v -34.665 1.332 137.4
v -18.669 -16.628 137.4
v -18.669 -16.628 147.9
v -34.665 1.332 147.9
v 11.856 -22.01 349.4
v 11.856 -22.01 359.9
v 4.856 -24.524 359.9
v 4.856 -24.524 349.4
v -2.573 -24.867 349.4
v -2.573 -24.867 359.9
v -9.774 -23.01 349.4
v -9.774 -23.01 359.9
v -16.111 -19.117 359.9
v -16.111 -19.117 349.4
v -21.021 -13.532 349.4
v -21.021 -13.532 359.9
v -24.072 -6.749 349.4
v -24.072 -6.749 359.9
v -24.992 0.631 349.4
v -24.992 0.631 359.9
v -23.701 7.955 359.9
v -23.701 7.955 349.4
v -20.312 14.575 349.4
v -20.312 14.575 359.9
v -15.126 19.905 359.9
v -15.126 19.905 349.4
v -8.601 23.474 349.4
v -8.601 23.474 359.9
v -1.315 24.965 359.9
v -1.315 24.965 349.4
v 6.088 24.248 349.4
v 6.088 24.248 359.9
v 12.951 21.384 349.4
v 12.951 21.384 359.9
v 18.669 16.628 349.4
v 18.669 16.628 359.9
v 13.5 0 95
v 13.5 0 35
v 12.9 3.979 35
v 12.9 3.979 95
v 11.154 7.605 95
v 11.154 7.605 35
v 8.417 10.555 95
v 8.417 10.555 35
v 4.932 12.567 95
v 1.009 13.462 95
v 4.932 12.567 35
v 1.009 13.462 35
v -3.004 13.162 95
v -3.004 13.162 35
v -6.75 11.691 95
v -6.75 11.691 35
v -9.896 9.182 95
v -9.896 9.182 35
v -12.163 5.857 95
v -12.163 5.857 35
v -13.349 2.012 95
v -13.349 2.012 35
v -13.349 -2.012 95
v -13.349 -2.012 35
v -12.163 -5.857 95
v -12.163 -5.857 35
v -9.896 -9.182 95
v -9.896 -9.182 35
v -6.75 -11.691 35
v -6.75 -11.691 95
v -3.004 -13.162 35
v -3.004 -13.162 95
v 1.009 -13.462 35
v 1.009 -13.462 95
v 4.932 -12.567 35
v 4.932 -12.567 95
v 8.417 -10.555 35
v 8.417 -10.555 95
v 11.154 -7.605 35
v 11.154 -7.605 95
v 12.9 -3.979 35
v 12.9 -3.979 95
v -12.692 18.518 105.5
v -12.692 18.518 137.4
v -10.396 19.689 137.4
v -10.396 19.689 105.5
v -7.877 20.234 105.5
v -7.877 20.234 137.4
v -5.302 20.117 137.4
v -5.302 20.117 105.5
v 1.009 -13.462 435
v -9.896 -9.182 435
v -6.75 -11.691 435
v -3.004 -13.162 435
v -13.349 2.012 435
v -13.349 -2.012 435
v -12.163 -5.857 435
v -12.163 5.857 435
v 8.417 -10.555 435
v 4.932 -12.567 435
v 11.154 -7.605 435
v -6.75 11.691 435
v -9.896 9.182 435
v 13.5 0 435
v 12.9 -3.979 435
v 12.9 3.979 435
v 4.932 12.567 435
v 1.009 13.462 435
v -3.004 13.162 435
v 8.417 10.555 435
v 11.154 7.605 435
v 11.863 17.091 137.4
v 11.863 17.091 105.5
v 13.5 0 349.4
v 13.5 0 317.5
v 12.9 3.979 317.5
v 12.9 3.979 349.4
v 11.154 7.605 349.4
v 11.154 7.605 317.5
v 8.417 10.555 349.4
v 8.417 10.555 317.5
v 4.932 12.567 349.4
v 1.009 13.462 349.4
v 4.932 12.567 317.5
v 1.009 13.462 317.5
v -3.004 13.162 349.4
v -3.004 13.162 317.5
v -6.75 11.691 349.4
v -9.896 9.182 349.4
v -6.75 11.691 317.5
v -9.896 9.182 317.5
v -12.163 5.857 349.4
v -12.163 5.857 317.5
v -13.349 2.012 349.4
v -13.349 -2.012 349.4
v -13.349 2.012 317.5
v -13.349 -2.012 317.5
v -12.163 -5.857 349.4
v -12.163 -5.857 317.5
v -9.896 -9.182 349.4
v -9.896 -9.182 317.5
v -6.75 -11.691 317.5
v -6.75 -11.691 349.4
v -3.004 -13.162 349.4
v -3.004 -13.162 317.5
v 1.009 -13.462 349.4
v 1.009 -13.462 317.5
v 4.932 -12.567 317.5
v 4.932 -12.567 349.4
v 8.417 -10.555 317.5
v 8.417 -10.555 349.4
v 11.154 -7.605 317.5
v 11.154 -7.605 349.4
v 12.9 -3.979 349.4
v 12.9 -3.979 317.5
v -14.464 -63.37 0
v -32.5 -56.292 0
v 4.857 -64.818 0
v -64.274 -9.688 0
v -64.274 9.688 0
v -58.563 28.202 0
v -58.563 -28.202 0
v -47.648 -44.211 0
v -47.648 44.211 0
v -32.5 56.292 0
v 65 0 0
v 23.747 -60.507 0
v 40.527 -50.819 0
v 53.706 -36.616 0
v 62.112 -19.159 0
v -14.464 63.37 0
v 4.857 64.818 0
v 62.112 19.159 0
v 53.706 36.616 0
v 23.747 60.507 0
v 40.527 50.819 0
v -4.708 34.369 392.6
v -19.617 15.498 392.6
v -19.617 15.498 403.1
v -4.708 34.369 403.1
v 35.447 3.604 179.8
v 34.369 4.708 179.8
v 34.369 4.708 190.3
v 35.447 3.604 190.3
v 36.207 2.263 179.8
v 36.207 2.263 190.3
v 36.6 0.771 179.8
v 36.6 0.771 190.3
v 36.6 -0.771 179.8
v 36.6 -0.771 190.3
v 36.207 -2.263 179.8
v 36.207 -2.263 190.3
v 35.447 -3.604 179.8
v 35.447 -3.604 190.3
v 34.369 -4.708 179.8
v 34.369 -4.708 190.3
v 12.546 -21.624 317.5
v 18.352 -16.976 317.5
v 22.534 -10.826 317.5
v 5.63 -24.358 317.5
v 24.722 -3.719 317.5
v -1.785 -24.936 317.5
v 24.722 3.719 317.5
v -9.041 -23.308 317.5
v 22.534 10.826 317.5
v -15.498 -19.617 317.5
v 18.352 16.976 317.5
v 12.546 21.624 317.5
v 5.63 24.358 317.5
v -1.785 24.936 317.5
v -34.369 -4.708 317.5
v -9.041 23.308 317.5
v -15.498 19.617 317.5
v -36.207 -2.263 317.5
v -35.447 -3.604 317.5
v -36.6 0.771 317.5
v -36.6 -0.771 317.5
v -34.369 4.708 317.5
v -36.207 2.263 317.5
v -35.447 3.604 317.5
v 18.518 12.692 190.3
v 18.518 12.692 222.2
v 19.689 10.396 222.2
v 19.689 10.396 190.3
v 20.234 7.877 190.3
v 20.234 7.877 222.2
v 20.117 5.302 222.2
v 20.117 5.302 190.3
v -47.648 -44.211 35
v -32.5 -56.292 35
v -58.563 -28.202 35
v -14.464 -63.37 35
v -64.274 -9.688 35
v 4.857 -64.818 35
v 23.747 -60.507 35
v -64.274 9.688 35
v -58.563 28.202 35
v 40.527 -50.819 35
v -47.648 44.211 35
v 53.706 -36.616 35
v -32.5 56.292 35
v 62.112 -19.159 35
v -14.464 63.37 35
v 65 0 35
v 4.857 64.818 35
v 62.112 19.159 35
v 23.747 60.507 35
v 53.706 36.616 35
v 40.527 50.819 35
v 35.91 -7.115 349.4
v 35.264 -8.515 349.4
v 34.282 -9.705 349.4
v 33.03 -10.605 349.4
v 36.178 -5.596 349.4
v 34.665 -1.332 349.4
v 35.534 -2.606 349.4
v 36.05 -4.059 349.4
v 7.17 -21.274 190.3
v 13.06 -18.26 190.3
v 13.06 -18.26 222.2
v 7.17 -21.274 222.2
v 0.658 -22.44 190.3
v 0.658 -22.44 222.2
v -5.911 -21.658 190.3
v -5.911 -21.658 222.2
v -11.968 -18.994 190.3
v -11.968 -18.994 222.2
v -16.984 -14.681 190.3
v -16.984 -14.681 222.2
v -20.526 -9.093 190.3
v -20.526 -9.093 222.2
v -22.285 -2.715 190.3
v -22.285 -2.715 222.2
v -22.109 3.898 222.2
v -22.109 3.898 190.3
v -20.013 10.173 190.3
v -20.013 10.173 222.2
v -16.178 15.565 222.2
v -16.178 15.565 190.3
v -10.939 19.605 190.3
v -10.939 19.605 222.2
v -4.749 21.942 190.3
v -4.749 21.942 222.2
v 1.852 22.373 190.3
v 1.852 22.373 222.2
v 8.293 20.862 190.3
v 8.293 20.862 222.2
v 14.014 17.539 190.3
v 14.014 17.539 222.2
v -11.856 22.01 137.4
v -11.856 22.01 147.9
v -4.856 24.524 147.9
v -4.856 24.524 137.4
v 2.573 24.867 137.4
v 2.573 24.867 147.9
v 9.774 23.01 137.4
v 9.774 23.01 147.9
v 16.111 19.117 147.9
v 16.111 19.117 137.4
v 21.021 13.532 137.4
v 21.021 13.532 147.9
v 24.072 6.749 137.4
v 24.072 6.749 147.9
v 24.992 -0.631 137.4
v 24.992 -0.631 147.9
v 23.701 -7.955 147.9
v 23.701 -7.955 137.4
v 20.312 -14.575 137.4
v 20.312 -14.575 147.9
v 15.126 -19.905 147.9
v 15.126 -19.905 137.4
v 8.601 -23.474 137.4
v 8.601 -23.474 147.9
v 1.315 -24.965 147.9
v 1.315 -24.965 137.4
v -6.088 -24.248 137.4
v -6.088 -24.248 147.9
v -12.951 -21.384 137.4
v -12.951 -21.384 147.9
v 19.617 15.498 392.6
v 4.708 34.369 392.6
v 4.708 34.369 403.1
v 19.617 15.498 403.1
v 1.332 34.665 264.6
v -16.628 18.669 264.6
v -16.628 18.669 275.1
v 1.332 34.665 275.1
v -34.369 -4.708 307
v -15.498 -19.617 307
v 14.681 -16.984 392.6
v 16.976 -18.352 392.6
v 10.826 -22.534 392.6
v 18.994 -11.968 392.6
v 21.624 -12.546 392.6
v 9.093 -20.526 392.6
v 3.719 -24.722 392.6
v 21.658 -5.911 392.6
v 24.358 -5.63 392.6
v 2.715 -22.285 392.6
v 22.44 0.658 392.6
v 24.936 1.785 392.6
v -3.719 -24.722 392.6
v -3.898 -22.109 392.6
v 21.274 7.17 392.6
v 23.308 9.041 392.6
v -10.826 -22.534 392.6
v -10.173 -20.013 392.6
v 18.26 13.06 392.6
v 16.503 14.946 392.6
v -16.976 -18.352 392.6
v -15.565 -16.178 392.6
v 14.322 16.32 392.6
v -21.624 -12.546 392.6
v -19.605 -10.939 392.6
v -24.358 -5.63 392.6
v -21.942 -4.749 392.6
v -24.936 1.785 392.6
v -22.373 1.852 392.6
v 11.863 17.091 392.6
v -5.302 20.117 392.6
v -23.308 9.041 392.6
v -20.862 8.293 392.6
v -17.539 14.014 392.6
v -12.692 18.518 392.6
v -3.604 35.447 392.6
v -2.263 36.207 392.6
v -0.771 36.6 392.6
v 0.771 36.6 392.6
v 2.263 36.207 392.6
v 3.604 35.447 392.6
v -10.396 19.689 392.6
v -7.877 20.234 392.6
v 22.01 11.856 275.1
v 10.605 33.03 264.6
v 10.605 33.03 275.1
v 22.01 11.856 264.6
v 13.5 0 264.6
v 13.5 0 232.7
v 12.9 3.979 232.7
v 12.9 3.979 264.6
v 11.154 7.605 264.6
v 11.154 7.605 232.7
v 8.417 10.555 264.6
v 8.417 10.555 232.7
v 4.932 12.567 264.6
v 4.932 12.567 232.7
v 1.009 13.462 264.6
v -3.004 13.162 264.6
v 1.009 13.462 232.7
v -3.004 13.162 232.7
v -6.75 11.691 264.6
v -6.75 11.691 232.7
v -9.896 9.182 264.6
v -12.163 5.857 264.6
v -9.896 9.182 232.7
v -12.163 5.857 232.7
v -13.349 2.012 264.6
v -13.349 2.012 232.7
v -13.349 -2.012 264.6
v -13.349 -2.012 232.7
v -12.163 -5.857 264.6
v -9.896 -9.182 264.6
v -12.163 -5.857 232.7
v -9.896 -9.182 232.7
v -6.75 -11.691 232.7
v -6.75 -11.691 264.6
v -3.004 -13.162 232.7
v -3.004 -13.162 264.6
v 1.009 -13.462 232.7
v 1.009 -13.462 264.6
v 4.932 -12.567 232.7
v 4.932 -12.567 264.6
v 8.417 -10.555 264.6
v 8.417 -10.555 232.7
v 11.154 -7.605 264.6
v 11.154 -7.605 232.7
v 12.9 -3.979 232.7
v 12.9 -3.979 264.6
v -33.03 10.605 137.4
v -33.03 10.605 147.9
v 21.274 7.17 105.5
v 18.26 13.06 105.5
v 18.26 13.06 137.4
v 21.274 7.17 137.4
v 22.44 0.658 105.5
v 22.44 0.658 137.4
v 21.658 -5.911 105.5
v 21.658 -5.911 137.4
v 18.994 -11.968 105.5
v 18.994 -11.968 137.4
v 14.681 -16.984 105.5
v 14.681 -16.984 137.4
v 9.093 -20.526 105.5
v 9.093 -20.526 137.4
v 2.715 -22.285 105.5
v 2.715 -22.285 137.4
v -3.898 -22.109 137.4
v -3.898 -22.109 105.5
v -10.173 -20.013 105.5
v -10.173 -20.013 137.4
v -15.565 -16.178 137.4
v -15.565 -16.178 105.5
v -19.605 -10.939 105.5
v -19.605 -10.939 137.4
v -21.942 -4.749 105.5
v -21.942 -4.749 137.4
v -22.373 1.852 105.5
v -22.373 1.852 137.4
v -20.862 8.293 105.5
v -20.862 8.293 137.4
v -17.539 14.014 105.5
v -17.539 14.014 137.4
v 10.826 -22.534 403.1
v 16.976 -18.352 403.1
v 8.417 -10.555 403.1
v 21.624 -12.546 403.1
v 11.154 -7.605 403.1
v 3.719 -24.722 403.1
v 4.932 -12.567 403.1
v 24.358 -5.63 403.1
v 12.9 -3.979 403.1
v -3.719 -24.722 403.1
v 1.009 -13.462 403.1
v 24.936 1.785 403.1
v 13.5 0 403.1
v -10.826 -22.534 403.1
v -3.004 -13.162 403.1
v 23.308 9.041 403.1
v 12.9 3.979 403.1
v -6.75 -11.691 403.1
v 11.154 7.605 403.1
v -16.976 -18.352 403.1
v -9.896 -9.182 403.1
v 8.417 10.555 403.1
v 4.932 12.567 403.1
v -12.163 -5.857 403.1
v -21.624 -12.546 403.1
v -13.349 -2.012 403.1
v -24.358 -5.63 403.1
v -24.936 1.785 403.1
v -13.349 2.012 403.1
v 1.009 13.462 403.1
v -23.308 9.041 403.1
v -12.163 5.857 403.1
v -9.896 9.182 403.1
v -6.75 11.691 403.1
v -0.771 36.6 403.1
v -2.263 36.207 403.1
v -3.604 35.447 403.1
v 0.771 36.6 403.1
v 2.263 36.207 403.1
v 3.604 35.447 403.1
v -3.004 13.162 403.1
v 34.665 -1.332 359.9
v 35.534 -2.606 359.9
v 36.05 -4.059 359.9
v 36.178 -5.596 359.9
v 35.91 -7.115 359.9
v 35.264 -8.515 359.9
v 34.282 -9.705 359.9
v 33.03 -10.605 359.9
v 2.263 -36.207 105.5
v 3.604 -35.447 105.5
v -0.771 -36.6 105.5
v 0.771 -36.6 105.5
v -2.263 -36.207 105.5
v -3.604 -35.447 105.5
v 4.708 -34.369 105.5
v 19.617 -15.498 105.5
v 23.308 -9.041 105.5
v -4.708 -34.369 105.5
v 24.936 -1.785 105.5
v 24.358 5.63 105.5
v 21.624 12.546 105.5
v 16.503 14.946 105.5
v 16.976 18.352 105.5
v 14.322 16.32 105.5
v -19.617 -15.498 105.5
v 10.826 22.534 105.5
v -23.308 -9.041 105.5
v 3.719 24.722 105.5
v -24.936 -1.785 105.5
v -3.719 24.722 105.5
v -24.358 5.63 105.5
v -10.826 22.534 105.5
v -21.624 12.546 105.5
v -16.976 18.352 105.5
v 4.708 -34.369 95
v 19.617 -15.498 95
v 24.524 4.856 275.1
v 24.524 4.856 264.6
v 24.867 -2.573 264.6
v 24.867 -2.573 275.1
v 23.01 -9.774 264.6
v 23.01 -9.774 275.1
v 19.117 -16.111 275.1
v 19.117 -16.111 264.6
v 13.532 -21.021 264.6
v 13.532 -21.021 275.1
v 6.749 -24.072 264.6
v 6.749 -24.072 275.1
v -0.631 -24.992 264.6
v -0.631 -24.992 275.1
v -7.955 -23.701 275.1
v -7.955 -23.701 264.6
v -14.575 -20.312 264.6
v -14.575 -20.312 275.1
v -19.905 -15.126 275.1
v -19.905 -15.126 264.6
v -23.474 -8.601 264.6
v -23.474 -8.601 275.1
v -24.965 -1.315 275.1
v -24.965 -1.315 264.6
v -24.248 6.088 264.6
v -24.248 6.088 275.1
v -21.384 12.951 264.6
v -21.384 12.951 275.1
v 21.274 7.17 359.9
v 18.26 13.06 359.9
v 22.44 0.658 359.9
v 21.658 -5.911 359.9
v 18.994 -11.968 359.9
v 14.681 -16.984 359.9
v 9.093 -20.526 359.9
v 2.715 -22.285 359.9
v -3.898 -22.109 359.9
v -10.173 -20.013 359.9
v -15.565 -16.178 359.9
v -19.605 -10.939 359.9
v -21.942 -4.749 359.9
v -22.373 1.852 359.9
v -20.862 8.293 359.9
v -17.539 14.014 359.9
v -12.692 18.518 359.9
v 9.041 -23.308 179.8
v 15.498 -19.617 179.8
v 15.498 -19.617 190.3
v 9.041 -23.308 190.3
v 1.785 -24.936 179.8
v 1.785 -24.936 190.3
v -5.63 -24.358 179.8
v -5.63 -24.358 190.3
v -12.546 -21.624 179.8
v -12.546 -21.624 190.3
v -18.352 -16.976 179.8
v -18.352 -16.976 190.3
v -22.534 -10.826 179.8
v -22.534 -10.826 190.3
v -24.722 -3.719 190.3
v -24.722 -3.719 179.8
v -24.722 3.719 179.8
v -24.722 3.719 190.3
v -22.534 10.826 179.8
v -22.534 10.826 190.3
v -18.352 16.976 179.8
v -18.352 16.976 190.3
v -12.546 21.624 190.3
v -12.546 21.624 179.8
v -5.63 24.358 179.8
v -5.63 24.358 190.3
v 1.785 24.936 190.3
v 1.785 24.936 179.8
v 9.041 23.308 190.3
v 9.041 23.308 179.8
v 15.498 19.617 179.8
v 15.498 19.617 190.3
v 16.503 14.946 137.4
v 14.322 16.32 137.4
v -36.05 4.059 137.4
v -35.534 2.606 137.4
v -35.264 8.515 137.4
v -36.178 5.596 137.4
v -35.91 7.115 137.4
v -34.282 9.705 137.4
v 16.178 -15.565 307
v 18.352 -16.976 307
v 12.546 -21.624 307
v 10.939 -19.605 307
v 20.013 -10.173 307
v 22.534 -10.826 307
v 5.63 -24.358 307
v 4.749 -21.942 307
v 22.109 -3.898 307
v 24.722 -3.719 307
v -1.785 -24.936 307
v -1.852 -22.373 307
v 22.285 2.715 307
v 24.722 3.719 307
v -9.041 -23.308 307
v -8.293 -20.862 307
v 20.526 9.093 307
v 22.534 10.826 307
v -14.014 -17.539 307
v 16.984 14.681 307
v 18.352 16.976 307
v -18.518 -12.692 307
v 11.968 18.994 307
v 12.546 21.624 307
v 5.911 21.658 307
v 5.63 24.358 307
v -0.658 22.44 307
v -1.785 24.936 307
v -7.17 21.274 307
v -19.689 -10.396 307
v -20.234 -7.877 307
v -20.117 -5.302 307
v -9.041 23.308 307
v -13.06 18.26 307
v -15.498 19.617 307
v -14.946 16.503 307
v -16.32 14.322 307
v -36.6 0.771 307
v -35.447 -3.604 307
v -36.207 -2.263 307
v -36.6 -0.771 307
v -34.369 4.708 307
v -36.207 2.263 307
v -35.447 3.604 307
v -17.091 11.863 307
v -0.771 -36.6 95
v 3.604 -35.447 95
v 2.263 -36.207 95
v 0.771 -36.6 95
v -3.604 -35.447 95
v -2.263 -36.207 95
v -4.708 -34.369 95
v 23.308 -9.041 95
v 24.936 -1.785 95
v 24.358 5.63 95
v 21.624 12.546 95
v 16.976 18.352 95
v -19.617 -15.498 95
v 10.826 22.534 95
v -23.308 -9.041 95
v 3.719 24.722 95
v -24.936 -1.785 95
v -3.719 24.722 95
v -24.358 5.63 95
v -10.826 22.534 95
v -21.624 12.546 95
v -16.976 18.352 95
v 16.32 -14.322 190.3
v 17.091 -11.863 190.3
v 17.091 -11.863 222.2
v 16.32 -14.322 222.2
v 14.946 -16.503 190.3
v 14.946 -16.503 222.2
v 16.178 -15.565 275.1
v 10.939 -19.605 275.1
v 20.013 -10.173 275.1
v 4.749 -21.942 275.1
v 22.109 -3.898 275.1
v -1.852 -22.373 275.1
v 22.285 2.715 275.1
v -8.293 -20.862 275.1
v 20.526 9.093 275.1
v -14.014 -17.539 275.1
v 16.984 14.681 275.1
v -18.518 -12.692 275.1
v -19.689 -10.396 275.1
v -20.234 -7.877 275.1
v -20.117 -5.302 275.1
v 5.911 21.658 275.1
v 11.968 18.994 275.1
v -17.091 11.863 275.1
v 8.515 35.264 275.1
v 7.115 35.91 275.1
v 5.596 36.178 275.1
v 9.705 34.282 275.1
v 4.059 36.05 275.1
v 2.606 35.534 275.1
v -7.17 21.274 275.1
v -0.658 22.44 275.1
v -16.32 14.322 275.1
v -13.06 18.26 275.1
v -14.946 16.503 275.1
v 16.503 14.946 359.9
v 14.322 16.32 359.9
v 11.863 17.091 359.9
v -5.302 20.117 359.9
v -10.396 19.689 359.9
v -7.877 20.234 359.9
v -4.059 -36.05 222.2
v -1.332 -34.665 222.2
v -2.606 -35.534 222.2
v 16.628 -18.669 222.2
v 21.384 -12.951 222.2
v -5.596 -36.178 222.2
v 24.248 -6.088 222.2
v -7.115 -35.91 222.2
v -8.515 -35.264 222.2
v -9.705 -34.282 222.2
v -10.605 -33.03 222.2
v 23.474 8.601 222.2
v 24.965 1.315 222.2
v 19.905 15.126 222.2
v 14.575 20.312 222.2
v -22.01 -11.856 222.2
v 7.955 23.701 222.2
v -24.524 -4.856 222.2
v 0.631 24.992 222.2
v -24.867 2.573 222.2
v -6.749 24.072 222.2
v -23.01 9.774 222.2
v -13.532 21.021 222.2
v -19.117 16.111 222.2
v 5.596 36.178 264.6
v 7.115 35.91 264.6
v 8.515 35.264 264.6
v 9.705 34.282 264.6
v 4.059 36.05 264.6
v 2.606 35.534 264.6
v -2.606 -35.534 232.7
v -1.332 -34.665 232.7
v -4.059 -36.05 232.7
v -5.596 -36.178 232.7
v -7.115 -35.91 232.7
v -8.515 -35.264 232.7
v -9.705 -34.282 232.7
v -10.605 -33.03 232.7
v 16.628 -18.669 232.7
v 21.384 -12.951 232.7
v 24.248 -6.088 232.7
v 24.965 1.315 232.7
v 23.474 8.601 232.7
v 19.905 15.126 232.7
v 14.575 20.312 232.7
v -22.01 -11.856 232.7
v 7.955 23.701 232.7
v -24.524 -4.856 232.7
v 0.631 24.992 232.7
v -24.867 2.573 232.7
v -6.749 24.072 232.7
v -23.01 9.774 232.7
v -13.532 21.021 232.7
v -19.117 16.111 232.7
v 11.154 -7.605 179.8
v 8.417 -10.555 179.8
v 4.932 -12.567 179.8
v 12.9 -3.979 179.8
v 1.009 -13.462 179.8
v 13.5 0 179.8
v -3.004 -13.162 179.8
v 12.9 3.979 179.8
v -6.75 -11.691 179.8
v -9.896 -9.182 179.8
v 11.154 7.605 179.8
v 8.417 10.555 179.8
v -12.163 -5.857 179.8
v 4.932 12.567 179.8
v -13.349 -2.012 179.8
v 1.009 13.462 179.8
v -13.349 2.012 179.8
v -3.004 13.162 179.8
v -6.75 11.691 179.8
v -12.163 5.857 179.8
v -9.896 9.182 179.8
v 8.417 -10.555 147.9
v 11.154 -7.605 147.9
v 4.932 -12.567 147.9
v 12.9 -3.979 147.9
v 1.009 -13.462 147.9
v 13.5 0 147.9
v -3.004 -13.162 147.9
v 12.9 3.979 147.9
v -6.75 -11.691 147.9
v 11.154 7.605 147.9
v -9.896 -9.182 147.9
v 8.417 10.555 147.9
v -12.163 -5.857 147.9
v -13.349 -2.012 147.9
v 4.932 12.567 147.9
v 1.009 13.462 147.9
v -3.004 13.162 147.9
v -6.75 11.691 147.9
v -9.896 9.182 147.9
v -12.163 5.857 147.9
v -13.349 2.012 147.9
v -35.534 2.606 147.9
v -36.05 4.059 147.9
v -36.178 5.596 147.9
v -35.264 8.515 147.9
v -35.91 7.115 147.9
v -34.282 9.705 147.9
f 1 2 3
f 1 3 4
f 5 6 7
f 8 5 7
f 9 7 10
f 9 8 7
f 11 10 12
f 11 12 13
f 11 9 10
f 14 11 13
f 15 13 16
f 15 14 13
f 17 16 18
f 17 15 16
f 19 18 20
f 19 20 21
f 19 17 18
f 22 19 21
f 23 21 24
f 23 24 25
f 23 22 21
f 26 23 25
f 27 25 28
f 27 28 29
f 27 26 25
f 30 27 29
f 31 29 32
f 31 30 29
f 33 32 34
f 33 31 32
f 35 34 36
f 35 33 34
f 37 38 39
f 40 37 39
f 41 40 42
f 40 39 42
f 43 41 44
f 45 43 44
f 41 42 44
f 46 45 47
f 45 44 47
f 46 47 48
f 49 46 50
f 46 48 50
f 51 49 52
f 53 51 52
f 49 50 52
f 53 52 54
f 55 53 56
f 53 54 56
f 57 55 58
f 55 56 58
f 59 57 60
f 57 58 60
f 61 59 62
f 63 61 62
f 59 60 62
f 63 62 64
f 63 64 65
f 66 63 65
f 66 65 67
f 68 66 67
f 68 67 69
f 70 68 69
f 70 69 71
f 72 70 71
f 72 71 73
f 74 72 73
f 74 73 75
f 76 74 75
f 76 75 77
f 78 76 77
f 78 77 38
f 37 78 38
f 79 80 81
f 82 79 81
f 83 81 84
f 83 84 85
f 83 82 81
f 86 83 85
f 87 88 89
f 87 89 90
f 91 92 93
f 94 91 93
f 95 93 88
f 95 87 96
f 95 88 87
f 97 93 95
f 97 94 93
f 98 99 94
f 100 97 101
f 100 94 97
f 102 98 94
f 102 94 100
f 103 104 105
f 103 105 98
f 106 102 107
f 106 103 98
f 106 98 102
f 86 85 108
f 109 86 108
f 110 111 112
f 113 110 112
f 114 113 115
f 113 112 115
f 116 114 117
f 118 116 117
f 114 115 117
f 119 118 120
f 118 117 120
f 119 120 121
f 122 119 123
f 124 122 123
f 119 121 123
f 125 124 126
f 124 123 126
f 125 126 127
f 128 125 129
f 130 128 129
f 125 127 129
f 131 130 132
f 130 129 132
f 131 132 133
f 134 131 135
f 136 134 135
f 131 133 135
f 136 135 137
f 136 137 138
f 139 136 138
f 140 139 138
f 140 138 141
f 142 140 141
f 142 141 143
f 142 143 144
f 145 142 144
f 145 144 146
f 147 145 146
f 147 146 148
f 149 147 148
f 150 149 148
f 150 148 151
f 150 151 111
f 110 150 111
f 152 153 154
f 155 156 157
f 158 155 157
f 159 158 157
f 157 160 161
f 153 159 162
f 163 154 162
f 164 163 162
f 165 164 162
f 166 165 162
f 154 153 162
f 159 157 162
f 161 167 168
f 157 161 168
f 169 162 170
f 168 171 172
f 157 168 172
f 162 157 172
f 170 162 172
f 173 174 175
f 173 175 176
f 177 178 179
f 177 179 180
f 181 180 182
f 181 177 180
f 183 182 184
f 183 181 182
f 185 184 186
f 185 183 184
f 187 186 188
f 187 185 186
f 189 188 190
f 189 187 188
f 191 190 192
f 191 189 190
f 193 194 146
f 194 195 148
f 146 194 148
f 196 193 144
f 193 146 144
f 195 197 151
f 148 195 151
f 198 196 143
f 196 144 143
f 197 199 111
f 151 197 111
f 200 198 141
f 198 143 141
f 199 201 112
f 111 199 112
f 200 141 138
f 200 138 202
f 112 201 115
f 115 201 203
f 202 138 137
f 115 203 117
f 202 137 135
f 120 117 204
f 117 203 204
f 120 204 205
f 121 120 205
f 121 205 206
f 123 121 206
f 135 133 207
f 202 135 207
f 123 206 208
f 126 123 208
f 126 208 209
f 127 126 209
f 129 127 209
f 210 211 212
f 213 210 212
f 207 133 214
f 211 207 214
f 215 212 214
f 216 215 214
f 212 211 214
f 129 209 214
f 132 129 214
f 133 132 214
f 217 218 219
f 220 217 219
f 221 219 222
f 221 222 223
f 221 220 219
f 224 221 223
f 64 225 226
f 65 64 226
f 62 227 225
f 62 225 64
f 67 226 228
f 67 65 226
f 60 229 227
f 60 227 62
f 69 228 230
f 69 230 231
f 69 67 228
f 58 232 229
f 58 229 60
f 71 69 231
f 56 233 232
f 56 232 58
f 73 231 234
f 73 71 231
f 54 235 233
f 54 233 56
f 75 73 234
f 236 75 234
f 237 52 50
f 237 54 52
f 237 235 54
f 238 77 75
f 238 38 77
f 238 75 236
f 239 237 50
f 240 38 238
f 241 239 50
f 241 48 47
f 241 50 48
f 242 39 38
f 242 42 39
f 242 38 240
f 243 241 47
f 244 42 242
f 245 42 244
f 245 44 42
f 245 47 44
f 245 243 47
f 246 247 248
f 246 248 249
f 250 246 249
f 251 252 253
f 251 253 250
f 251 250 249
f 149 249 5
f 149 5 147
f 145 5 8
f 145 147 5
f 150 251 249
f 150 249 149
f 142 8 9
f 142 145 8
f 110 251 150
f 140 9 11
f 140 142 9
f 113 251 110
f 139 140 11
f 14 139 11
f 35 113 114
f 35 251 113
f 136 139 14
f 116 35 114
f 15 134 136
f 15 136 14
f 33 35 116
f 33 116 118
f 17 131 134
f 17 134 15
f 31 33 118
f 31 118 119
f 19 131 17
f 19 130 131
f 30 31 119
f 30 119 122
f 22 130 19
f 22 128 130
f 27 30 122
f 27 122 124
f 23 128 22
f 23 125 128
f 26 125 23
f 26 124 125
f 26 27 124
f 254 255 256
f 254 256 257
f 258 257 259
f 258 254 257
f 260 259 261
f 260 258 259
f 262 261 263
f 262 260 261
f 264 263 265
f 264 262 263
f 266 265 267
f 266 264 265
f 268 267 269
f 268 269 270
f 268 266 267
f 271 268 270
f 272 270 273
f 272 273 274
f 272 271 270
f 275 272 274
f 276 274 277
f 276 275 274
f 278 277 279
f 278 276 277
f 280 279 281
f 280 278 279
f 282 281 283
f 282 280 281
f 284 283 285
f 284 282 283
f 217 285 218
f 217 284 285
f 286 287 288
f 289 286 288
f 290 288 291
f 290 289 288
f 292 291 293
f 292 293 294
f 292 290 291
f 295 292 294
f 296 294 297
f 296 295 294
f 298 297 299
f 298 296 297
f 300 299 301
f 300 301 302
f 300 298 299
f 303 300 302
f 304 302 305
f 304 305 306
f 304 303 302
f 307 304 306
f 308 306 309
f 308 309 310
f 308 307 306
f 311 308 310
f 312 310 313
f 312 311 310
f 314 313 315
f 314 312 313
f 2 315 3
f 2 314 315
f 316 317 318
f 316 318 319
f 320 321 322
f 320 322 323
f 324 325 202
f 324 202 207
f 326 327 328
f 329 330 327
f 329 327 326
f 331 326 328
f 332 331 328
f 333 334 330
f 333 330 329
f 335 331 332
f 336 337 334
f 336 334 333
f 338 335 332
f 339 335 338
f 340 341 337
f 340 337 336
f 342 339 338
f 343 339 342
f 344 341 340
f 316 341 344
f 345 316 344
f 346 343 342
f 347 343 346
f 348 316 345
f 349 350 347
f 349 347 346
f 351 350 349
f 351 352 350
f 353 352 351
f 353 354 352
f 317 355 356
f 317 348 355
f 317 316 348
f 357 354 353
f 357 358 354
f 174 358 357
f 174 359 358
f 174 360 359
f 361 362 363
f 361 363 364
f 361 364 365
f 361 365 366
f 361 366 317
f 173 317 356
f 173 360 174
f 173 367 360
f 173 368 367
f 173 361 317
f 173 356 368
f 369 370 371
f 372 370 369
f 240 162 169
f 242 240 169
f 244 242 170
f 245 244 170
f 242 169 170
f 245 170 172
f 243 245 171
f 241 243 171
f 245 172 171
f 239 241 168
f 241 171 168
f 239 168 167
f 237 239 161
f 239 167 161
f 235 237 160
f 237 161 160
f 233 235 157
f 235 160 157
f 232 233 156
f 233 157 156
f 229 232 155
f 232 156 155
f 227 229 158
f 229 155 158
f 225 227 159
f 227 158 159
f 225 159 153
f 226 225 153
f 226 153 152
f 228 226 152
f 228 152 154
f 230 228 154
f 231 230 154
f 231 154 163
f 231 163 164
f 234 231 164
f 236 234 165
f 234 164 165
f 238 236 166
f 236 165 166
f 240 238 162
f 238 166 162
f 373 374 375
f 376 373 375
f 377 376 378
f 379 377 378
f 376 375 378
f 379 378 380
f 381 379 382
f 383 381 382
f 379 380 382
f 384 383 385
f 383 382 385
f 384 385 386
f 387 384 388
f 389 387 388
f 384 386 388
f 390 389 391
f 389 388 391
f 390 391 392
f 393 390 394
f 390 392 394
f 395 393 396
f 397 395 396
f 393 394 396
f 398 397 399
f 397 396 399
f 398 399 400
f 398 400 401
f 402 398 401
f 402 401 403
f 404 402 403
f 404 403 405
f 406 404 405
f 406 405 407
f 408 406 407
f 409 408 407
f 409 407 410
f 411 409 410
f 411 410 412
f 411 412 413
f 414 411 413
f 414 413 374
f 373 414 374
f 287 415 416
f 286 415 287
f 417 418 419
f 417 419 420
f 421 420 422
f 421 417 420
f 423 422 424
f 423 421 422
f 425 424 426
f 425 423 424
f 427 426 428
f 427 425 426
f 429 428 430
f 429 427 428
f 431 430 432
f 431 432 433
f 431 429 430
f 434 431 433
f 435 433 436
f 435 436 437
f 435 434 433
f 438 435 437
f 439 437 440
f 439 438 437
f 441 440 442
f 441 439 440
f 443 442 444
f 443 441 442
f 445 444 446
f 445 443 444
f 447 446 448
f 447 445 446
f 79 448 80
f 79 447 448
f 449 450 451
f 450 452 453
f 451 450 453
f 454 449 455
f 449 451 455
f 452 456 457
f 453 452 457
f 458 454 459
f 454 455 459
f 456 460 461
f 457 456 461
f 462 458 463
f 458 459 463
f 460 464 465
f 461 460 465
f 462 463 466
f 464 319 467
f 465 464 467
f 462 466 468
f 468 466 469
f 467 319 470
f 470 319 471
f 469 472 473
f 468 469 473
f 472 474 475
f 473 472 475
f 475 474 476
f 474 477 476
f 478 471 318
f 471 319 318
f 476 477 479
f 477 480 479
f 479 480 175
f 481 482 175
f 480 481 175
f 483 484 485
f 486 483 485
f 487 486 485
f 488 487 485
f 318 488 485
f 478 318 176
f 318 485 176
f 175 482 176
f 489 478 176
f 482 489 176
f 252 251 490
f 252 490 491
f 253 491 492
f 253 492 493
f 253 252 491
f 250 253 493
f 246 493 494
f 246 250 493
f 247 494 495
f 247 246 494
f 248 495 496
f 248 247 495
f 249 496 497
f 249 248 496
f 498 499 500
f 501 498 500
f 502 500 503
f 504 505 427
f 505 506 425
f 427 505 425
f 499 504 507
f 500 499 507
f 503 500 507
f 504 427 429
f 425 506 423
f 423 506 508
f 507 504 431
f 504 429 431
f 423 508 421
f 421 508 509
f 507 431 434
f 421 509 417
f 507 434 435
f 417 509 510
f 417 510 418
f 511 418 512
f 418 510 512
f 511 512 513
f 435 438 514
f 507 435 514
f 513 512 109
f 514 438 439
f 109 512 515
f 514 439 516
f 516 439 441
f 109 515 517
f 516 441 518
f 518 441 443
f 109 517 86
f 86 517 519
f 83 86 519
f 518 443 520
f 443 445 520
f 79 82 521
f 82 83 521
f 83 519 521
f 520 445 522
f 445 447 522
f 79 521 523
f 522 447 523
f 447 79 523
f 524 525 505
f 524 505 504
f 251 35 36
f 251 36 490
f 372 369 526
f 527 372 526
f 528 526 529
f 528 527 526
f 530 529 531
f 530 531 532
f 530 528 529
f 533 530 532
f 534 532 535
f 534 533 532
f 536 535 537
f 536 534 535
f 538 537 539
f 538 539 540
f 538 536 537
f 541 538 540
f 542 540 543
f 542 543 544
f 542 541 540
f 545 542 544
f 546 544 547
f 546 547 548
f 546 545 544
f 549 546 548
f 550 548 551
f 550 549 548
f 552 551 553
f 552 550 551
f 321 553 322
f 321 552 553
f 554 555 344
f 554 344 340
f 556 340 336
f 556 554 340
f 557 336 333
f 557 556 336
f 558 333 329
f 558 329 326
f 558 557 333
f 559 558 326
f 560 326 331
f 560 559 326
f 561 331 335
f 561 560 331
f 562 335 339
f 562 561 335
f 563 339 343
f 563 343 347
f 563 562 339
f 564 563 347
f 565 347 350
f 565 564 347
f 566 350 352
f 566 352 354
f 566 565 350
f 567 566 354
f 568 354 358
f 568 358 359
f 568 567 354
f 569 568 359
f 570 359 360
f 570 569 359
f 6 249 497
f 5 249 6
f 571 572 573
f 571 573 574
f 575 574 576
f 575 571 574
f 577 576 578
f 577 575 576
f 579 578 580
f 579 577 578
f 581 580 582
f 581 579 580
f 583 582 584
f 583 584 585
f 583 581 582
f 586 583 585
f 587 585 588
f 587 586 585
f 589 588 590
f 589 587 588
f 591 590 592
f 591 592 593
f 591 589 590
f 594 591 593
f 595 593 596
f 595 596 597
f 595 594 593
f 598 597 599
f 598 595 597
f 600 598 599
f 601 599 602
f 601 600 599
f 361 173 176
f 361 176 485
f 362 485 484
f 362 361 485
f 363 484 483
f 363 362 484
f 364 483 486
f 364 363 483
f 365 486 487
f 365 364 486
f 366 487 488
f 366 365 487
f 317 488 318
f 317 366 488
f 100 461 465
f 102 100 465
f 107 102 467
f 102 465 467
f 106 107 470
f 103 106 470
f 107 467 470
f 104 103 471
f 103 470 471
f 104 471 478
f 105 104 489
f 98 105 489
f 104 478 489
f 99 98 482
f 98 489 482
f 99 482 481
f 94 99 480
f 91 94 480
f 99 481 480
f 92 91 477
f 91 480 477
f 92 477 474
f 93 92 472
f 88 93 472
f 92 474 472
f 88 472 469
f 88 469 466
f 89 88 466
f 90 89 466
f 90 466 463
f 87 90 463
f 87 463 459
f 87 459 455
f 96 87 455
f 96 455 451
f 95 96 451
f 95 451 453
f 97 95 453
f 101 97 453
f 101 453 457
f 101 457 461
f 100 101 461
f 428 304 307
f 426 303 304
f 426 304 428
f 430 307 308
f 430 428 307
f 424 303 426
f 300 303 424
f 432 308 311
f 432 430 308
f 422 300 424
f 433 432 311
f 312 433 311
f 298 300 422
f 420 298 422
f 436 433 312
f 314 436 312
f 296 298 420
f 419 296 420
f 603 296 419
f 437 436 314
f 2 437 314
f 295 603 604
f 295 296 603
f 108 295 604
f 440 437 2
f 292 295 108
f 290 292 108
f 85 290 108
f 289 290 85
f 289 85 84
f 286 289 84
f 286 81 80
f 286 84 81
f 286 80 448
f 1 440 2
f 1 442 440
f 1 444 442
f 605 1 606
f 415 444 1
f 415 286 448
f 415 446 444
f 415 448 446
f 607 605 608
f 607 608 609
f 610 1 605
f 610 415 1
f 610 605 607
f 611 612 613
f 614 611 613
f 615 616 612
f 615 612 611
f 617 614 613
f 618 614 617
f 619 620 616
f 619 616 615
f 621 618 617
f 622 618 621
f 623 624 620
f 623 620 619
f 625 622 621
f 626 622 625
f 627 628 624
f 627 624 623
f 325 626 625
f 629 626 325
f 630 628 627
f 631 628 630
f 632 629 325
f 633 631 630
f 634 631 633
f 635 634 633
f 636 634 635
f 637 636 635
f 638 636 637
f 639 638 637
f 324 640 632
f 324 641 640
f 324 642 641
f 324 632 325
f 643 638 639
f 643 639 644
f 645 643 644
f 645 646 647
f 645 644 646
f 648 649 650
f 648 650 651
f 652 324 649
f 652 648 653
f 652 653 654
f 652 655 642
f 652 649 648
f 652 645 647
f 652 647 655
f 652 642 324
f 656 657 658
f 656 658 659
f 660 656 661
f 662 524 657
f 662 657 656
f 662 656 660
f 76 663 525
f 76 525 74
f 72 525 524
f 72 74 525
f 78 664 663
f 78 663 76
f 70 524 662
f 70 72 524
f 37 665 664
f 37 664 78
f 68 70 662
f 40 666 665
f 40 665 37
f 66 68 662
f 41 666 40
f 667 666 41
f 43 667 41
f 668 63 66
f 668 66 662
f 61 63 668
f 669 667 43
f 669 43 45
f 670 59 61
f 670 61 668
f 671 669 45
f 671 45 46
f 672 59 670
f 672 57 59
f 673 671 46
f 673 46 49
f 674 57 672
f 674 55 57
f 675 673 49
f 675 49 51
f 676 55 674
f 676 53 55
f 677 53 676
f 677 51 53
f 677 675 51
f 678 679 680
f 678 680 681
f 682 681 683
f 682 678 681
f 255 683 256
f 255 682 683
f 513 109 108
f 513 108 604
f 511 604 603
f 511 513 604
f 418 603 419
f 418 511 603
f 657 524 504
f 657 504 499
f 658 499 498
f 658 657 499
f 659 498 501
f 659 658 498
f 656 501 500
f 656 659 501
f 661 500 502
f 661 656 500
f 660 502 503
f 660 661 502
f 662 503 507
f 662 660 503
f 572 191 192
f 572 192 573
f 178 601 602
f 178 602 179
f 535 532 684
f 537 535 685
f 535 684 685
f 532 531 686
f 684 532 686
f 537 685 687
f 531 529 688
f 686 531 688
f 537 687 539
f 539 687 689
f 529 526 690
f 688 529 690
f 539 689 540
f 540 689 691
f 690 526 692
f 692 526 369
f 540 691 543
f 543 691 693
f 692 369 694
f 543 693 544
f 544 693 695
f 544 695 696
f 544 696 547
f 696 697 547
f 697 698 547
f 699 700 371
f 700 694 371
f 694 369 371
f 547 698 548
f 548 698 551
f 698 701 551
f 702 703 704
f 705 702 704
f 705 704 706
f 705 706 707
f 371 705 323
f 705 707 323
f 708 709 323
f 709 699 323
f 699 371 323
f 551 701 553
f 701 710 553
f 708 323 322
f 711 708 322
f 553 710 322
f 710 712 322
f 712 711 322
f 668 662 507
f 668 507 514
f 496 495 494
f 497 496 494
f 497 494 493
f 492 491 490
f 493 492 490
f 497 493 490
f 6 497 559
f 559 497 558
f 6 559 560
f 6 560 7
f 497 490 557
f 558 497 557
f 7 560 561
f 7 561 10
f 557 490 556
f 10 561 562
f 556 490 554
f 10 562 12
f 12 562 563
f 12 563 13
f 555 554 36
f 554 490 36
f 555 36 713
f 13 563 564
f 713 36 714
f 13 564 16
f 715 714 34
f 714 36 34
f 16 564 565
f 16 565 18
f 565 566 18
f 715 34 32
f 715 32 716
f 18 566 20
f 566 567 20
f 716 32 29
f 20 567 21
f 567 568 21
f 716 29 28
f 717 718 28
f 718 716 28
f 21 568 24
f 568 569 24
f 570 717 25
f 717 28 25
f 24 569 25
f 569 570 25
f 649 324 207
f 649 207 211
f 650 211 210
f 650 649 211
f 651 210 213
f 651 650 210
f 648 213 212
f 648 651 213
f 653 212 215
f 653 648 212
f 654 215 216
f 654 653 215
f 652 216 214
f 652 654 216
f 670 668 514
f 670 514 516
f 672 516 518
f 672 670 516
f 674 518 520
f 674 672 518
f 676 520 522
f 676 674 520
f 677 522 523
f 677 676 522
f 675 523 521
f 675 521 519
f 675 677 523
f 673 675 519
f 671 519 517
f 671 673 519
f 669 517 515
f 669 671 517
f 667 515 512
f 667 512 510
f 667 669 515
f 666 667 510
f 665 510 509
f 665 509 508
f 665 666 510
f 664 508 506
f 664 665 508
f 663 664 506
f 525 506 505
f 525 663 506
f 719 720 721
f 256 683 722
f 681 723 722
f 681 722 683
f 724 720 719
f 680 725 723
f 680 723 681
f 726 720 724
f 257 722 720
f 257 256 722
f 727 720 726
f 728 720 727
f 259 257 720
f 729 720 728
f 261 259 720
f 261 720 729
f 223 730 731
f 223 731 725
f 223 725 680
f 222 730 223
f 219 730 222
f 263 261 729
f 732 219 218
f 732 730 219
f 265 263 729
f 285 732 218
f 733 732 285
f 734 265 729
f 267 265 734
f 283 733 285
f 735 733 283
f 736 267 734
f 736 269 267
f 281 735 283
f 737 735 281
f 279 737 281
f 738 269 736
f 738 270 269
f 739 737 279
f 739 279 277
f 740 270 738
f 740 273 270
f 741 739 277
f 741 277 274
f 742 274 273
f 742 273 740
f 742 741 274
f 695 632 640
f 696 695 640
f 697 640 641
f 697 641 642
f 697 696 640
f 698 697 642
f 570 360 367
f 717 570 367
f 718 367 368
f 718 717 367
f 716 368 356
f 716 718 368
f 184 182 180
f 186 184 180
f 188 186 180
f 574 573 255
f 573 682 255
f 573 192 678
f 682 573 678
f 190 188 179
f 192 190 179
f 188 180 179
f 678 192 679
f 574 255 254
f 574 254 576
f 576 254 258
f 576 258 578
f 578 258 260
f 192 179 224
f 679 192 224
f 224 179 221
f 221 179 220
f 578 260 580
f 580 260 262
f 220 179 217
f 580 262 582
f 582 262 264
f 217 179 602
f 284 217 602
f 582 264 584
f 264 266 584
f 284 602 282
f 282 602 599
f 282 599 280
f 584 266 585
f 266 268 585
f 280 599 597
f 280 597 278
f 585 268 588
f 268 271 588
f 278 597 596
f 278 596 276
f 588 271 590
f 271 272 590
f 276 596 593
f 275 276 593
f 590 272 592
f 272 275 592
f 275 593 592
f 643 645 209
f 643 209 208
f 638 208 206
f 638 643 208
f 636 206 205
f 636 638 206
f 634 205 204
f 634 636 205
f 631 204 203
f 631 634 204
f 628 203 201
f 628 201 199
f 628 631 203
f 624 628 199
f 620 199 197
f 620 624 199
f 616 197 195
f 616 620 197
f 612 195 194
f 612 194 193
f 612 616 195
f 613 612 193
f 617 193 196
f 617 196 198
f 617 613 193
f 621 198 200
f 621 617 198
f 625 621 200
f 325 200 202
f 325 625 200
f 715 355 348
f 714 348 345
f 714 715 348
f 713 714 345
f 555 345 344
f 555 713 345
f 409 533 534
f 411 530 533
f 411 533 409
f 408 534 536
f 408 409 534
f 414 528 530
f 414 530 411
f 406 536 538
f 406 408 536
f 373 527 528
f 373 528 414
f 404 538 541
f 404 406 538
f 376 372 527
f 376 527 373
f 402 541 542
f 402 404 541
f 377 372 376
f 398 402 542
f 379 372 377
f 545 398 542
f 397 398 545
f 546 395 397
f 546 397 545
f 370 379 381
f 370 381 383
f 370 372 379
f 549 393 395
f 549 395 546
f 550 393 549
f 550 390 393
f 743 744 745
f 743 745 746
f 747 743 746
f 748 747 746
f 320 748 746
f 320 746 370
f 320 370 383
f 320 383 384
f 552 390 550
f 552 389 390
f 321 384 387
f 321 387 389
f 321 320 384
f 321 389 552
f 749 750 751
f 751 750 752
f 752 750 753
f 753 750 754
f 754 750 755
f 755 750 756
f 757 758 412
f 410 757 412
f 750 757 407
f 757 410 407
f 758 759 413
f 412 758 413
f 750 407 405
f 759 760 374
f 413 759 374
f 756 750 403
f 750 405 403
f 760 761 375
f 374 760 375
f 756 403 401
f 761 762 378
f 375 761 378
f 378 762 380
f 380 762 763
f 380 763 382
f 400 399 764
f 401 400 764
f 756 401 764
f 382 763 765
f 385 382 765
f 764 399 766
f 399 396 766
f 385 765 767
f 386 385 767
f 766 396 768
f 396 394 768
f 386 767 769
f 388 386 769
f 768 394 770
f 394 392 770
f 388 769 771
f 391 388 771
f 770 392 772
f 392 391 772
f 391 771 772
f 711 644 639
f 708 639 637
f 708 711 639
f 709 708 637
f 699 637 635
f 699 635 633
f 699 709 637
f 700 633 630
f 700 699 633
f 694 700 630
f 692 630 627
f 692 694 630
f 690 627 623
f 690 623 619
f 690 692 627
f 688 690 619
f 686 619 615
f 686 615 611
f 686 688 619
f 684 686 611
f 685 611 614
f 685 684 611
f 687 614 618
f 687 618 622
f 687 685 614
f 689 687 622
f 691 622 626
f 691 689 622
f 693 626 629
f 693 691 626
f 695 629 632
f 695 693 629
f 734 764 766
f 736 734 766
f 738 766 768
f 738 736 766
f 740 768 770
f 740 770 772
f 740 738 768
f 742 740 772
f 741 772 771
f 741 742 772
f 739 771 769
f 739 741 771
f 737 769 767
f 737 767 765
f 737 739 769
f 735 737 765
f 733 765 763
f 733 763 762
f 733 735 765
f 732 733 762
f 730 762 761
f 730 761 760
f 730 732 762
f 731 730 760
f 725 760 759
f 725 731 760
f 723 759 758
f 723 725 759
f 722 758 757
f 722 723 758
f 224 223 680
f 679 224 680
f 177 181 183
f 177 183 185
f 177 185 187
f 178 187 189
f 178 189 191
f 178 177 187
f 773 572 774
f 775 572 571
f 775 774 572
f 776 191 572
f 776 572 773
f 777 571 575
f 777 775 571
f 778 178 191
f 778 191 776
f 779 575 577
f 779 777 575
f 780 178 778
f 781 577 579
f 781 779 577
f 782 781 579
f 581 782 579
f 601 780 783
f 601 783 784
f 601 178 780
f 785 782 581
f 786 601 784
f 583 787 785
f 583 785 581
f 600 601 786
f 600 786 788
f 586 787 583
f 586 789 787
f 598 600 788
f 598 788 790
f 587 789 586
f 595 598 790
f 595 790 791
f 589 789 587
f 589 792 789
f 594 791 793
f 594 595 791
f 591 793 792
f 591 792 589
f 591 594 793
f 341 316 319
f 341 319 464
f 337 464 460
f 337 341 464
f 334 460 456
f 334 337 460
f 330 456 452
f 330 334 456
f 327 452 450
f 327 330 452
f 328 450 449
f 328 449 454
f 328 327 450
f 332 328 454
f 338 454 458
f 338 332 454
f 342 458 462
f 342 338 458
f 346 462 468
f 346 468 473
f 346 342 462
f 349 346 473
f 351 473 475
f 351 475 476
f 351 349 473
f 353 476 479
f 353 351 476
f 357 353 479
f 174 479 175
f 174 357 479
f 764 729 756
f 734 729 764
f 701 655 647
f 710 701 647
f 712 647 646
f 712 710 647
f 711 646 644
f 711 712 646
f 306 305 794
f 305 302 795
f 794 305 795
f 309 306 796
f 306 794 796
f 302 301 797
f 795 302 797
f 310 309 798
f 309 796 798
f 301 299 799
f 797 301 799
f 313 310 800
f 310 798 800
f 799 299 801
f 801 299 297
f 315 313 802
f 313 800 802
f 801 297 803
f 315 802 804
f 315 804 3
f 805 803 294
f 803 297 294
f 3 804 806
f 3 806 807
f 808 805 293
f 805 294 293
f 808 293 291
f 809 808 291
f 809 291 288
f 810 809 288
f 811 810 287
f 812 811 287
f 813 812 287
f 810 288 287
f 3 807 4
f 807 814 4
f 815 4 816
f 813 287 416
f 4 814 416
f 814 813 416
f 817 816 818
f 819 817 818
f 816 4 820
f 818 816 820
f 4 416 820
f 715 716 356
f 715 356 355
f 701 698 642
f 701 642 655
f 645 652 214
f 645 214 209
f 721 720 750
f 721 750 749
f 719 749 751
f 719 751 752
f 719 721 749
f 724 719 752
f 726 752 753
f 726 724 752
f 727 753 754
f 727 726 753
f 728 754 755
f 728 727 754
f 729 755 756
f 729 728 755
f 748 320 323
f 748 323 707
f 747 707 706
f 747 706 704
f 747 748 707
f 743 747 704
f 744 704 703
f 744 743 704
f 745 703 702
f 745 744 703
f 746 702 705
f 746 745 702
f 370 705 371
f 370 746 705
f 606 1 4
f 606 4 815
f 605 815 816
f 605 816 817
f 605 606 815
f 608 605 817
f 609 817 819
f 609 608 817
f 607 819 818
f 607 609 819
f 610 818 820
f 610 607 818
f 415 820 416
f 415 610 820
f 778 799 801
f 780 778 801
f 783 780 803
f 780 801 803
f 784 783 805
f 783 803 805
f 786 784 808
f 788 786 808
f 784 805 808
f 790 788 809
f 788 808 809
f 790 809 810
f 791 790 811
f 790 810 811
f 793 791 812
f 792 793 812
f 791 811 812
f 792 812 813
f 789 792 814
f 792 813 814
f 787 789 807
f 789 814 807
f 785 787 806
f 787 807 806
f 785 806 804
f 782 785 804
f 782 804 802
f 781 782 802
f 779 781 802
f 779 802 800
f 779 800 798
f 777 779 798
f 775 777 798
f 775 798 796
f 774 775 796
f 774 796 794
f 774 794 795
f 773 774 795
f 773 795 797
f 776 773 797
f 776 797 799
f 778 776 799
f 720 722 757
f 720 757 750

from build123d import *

# Parameters (mm, degrees)
CROQUIS1_R               = 65
SALIENTE_EXTRUIR2_DEPTH  = 35
CROQUIS2_R               = 13.5
SALIENTE_EXTRUIR3_DEPTH  = 400
CROQUIS3_R               = 13.5
SALIENTE_EXTRUIR4_DEPTH  = 10.5
CROQUIS4_R               = 13.5
SALIENTE_EXTRUIR6_DEPTH  = 10.5
CROQUIS5_R               = 13.5
SALIENTE_EXTRUIR7_DEPTH  = 10.5
CROQUIS6_R               = 13.5
SALIENTE_EXTRUIR8_DEPTH  = 10.5
CROQUIS7_R               = 13.5
SALIENTE_EXTRUIR9_DEPTH  = 10.5
CROQUIS8_R               = 13.5
SALIENTE_EXTRUIR10_DEPTH = 10.5
CROQUIS9_R               = 13.5
SALIENTE_EXTRUIR11_DEPTH = 10.5
CROQUIS10_R              = 13.5
SALIENTE_EXTRUIR12_DEPTH = 10.5
SALIENTE_EXTRUIR13_DEPTH = 32.7
SALIENTE_EXTRUIR14_DEPTH = 31.9
SALIENTE_EXTRUIR15_DEPTH = 31.9
SALIENTE_EXTRUIR16_DEPTH = 31.9


with BuildPart() as part:
    # Croquis1 → Saliente-Extruir2 (new body)
    with BuildSketch(Plane.XY):
        Circle(CROQUIS1_R)
    extrude(amount=SALIENTE_EXTRUIR2_DEPTH)

    # Croquis2 → Saliente-Extruir3 (add)
    with BuildSketch(Plane.XY.offset(35)):
        Circle(CROQUIS2_R)
    extrude(amount=SALIENTE_EXTRUIR3_DEPTH)

    # Croquis3 → Saliente-Extruir4 (add)
    with BuildSketch(Plane.XY.offset(392.6)):
        with BuildLine():
            Line((-19.616978627, 15.497553018), (-4.708074871, 34.369412724))
            ThreePointArc((-4.708074871, 34.369412724), (0, 36.65), (4.708074871, 34.369412724))
            Line((4.708074871, 34.369412724), (19.616978627, 15.497553018))
            ThreePointArc((19.616978627, 15.497553018), (0, -25), (-19.616978627, 15.497553018))
        make_face()
        Circle(CROQUIS3_R, mode=Mode.SUBTRACT)
    extrude(amount=SALIENTE_EXTRUIR4_DEPTH)

    # Croquis4 → Saliente-Extruir6 (add)
    with BuildSketch(Plane.XY.offset(349.4)):
        with BuildLine():
            Line((18.668562955, 16.627830803), (34.664812739, -1.331637253))
            ThreePointArc((34.664812739, -1.331637253), (36.093204148, -6.364205711), (33.029715496, -10.604734521))
            Line((33.029715496, -10.604734521), (11.855657775, -22.010074483))
            ThreePointArc((11.855657775, -22.010074483), (-24.620193825, 4.341204442), (18.668562955, 16.627830803))
        make_face()
        Circle(CROQUIS4_R, mode=Mode.SUBTRACT)
    extrude(amount=SALIENTE_EXTRUIR6_DEPTH)

    # Croquis5 → Saliente-Extruir7 (add)
    with BuildSketch(Plane.XY.offset(307)):
        with BuildLine():
            Line((-15.497553018, -19.616978627), (-34.369412724, -4.708074871))
            ThreePointArc((-34.369412724, -4.708074871), (-36.65, 0), (-34.369412724, 4.708074871))
            Line((-34.369412724, 4.708074871), (-15.497553018, 19.616978627))
            ThreePointArc((-15.497553018, 19.616978627), (25, 0), (-15.497553018, -19.616978627))
        make_face()
        Circle(CROQUIS5_R, mode=Mode.SUBTRACT)
    extrude(amount=SALIENTE_EXTRUIR7_DEPTH)

    # Croquis6 → Saliente-Extruir8 (add)
    with BuildSketch(Plane.XY.offset(264.6)):
        with BuildLine():
            Line((-16.627830803, 18.668562955), (1.331637253, 34.664812739))
            ThreePointArc((1.331637253, 34.664812739), (6.364205711, 36.093204148), (10.604734521, 33.029715496))
            Line((10.604734521, 33.029715496), (22.010074483, 11.855657775))
            ThreePointArc((22.010074483, 11.855657775), (-4.341204442, -24.620193825), (-16.627830803, 18.668562955))
        make_face()
        Circle(CROQUIS6_R, mode=Mode.SUBTRACT)
    extrude(amount=SALIENTE_EXTRUIR8_DEPTH)

    # Croquis7 → Saliente-Extruir9 (add)
    with BuildSketch(Plane.XY.offset(222.2)):
        with BuildLine():
            Line((16.627830803, -18.668562955), (-1.331637253, -34.664812739))
            ThreePointArc((-1.331637253, -34.664812739), (-6.364205711, -36.093204148), (-10.604734521, -33.029715496))
            Line((-10.604734521, -33.029715496), (-22.010074483, -11.855657775))
            ThreePointArc((-22.010074483, -11.855657775), (4.341204442, 24.620193825), (16.627830803, -18.668562955))
        make_face()
        Circle(CROQUIS7_R, mode=Mode.SUBTRACT)
    extrude(amount=SALIENTE_EXTRUIR9_DEPTH)

    # Croquis8 → Saliente-Extruir10 (add)
    with BuildSketch(Plane.XY.offset(179.8)):
        with BuildLine():
            Line((15.497553018, 19.616978627), (34.369412724, 4.708074871))
            ThreePointArc((34.369412724, 4.708074871), (36.65, 0), (34.369412724, -4.708074871))
            Line((34.369412724, -4.708074871), (15.497553018, -19.616978627))
            ThreePointArc((15.497553018, -19.616978627), (-25, 0), (15.497553018, 19.616978627))
        make_face()
        Circle(CROQUIS8_R, mode=Mode.SUBTRACT)
    extrude(amount=SALIENTE_EXTRUIR10_DEPTH)

    # Croquis9 → Saliente-Extruir11 (add)
    with BuildSketch(Plane.XY.offset(137.4)):
        with BuildLine():
            Line((-18.668562955, -16.627830803), (-34.664812739, 1.331637253))
            ThreePointArc((-34.664812739, 1.331637253), (-36.093204148, 6.364205711), (-33.029715496, 10.604734521))
            Line((-33.029715496, 10.604734521), (-11.855657775, 22.010074483))
            ThreePointArc((-11.855657775, 22.010074483), (24.620193825, -4.341204442), (-18.668562955, -16.627830803))
        make_face()
        Circle(CROQUIS9_R, mode=Mode.SUBTRACT)
    extrude(amount=SALIENTE_EXTRUIR11_DEPTH)

    # Croquis10 → Saliente-Extruir12 (add)
    with BuildSketch(Plane.XY.offset(95)):
        with BuildLine():
            Line((19.616978627, -15.497553018), (4.708074871, -34.369412724))
            ThreePointArc((4.708074871, -34.369412724), (0, -36.65), (-4.708074871, -34.369412724))
            Line((-4.708074871, -34.369412724), (-19.616978627, -15.497553018))
            ThreePointArc((-19.616978627, -15.497553018), (0, 25), (19.616978627, -15.497553018))
        make_face()
        Circle(CROQUIS10_R, mode=Mode.SUBTRACT)
    extrude(amount=SALIENTE_EXTRUIR12_DEPTH)

    # Croquis11 → Saliente-Extruir13 (add)
    with BuildSketch(Plane.XY.offset(359.9)):
        with BuildLine():
            Line((-5.302212899, 20.117414279), (11.86301125, 17.090722131))
            ThreePointArc((11.86301125, 17.090722131), (15.45729222, 15.703316474), (18.260288087, 13.060029823))
            ThreePointArc((18.260288087, 13.060029823), (-3.898401589, -22.108934055), (-12.692264697, 18.517800001))
            ThreePointArc((-12.692264697, 18.517800001), (-9.154252885, 20.042995913), (-5.302212899, 20.117414279))
        make_face()
    extrude(amount=SALIENTE_EXTRUIR13_DEPTH)

    # Croquis12 → Saliente-Extruir14 (add)
    with BuildSketch(Plane.XY.offset(275.1)):
        with BuildLine():
            Line((-20.117414279, -5.302212899), (-17.090722131, 11.86301125))
            ThreePointArc((-17.090722131, 11.86301125), (-15.703316474, 15.45729222), (-13.060029823, 18.260288087))
            ThreePointArc((-13.060029823, 18.260288087), (22.108934055, -3.898401589), (-18.517800001, -12.692264697))
            ThreePointArc((-18.517800001, -12.692264697), (-20.042995913, -9.154252885), (-20.117414279, -5.302212899))
        make_face()
    extrude(amount=SALIENTE_EXTRUIR14_DEPTH)

    # Croquis14 → Saliente-Extruir15 (add)
    with BuildSketch(Plane.XY.offset(190.3)):
        with BuildLine():
            Line((20.117414279, 5.302212899), (17.090722131, -11.86301125))
            ThreePointArc((17.090722131, -11.86301125), (15.703316474, -15.45729222), (13.060029823, -18.260288087))
            ThreePointArc((13.060029823, -18.260288087), (-22.108934055, 3.898401589), (18.517800001, 12.692264697))
            ThreePointArc((18.517800001, 12.692264697), (20.042995913, 9.154252885), (20.117414279, 5.302212899))
        make_face()
    extrude(amount=SALIENTE_EXTRUIR15_DEPTH)

    # Croquis15 → Saliente-Extruir16 (add)
    with BuildSketch(Plane.XY.offset(105.5)):
        with BuildLine():
            Line((-5.302212899, 20.117414279), (11.86301125, 17.090722131))
            ThreePointArc((11.86301125, 17.090722131), (15.45729222, 15.703316474), (18.260288087, 13.060029823))
            ThreePointArc((18.260288087, 13.060029823), (-3.898401589, -22.108934055), (-12.692264697, 18.517800001))
            ThreePointArc((-12.692264697, 18.517800001), (-9.154252885, 20.042995913), (-5.302212899, 20.117414279))
        make_face()
    extrude(amount=SALIENTE_EXTRUIR16_DEPTH)


solid = part.part
